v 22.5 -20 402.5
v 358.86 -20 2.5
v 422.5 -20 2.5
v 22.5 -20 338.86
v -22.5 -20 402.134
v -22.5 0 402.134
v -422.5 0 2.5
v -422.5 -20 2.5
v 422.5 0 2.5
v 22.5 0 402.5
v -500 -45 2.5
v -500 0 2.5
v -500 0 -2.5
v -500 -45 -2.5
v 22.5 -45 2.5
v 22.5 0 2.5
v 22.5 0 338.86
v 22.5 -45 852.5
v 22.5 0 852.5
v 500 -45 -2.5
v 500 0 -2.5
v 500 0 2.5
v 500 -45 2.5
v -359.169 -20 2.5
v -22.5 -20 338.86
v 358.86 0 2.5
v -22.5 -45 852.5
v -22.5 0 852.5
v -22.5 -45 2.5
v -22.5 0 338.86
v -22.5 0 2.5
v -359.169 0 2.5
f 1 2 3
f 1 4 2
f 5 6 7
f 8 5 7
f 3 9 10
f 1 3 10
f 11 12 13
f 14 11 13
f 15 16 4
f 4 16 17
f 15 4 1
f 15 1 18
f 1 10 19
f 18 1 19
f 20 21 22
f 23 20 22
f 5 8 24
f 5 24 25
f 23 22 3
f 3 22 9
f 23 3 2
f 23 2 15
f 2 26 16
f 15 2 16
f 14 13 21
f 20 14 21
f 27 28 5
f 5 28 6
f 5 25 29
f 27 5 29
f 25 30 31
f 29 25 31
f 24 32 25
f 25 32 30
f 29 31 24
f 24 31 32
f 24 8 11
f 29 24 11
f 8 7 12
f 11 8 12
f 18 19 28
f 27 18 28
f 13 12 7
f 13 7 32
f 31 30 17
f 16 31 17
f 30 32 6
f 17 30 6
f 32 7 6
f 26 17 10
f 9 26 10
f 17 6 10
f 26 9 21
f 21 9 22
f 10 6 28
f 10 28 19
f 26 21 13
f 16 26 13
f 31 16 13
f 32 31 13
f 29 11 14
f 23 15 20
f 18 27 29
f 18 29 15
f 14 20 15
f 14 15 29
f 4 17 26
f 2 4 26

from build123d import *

# Parameters (mm, degrees)
F1_DEPTH = 45
F2_DEPTH = 20


with BuildPart() as f1:
    # F0 (on Front) → F1 (new body)
    with BuildSketch(Plane.XZ):
        Polygon((22.5, 338.86039), (22.5, 402.5), (22.5, 852.5), (-22.5, 852.5), (-22.5, 402.133873), (-22.5, 338.86039), (-22.5, 2.5), (22.5, 2.5), align=None)
        Polygon((500, -2.5), (500, 2.5), (422.5, 2.5), (358.86039, 2.5), (22.5, 2.5), (-22.5, 2.5), (-359.168549, 2.5), (-422.5, 2.5), (-500, 2.5), (-500, -2.5), align=None)
    extrude(amount=F1_DEPTH)

    # F0 (on Front) → F2 (join)
    with BuildSketch(Plane.XZ):
        Polygon((500, -2.5), (500, 2.5), (422.5, 2.5), (358.86039, 2.5), (22.5, 2.5), (-22.5, 2.5), (-359.168549, 2.5), (-422.5, 2.5), (-500, 2.5), (-500, -2.5), align=None)
        Polygon((358.86039, 2.5), (422.5, 2.5), (22.5, 402.5), (22.5, 338.86039), align=None)
        Polygon((22.5, 338.86039), (22.5, 402.5), (22.5, 852.5), (-22.5, 852.5), (-22.5, 402.133873), (-22.5, 338.86039), (-22.5, 2.5), (22.5, 2.5), align=None)
        Polygon((-22.5, 402.133873), (-422.5, 2.5), (-359.168549, 2.5), (-22.5, 338.86039), align=None)
    extrude(amount=F2_DEPTH)


solid = f1.part
